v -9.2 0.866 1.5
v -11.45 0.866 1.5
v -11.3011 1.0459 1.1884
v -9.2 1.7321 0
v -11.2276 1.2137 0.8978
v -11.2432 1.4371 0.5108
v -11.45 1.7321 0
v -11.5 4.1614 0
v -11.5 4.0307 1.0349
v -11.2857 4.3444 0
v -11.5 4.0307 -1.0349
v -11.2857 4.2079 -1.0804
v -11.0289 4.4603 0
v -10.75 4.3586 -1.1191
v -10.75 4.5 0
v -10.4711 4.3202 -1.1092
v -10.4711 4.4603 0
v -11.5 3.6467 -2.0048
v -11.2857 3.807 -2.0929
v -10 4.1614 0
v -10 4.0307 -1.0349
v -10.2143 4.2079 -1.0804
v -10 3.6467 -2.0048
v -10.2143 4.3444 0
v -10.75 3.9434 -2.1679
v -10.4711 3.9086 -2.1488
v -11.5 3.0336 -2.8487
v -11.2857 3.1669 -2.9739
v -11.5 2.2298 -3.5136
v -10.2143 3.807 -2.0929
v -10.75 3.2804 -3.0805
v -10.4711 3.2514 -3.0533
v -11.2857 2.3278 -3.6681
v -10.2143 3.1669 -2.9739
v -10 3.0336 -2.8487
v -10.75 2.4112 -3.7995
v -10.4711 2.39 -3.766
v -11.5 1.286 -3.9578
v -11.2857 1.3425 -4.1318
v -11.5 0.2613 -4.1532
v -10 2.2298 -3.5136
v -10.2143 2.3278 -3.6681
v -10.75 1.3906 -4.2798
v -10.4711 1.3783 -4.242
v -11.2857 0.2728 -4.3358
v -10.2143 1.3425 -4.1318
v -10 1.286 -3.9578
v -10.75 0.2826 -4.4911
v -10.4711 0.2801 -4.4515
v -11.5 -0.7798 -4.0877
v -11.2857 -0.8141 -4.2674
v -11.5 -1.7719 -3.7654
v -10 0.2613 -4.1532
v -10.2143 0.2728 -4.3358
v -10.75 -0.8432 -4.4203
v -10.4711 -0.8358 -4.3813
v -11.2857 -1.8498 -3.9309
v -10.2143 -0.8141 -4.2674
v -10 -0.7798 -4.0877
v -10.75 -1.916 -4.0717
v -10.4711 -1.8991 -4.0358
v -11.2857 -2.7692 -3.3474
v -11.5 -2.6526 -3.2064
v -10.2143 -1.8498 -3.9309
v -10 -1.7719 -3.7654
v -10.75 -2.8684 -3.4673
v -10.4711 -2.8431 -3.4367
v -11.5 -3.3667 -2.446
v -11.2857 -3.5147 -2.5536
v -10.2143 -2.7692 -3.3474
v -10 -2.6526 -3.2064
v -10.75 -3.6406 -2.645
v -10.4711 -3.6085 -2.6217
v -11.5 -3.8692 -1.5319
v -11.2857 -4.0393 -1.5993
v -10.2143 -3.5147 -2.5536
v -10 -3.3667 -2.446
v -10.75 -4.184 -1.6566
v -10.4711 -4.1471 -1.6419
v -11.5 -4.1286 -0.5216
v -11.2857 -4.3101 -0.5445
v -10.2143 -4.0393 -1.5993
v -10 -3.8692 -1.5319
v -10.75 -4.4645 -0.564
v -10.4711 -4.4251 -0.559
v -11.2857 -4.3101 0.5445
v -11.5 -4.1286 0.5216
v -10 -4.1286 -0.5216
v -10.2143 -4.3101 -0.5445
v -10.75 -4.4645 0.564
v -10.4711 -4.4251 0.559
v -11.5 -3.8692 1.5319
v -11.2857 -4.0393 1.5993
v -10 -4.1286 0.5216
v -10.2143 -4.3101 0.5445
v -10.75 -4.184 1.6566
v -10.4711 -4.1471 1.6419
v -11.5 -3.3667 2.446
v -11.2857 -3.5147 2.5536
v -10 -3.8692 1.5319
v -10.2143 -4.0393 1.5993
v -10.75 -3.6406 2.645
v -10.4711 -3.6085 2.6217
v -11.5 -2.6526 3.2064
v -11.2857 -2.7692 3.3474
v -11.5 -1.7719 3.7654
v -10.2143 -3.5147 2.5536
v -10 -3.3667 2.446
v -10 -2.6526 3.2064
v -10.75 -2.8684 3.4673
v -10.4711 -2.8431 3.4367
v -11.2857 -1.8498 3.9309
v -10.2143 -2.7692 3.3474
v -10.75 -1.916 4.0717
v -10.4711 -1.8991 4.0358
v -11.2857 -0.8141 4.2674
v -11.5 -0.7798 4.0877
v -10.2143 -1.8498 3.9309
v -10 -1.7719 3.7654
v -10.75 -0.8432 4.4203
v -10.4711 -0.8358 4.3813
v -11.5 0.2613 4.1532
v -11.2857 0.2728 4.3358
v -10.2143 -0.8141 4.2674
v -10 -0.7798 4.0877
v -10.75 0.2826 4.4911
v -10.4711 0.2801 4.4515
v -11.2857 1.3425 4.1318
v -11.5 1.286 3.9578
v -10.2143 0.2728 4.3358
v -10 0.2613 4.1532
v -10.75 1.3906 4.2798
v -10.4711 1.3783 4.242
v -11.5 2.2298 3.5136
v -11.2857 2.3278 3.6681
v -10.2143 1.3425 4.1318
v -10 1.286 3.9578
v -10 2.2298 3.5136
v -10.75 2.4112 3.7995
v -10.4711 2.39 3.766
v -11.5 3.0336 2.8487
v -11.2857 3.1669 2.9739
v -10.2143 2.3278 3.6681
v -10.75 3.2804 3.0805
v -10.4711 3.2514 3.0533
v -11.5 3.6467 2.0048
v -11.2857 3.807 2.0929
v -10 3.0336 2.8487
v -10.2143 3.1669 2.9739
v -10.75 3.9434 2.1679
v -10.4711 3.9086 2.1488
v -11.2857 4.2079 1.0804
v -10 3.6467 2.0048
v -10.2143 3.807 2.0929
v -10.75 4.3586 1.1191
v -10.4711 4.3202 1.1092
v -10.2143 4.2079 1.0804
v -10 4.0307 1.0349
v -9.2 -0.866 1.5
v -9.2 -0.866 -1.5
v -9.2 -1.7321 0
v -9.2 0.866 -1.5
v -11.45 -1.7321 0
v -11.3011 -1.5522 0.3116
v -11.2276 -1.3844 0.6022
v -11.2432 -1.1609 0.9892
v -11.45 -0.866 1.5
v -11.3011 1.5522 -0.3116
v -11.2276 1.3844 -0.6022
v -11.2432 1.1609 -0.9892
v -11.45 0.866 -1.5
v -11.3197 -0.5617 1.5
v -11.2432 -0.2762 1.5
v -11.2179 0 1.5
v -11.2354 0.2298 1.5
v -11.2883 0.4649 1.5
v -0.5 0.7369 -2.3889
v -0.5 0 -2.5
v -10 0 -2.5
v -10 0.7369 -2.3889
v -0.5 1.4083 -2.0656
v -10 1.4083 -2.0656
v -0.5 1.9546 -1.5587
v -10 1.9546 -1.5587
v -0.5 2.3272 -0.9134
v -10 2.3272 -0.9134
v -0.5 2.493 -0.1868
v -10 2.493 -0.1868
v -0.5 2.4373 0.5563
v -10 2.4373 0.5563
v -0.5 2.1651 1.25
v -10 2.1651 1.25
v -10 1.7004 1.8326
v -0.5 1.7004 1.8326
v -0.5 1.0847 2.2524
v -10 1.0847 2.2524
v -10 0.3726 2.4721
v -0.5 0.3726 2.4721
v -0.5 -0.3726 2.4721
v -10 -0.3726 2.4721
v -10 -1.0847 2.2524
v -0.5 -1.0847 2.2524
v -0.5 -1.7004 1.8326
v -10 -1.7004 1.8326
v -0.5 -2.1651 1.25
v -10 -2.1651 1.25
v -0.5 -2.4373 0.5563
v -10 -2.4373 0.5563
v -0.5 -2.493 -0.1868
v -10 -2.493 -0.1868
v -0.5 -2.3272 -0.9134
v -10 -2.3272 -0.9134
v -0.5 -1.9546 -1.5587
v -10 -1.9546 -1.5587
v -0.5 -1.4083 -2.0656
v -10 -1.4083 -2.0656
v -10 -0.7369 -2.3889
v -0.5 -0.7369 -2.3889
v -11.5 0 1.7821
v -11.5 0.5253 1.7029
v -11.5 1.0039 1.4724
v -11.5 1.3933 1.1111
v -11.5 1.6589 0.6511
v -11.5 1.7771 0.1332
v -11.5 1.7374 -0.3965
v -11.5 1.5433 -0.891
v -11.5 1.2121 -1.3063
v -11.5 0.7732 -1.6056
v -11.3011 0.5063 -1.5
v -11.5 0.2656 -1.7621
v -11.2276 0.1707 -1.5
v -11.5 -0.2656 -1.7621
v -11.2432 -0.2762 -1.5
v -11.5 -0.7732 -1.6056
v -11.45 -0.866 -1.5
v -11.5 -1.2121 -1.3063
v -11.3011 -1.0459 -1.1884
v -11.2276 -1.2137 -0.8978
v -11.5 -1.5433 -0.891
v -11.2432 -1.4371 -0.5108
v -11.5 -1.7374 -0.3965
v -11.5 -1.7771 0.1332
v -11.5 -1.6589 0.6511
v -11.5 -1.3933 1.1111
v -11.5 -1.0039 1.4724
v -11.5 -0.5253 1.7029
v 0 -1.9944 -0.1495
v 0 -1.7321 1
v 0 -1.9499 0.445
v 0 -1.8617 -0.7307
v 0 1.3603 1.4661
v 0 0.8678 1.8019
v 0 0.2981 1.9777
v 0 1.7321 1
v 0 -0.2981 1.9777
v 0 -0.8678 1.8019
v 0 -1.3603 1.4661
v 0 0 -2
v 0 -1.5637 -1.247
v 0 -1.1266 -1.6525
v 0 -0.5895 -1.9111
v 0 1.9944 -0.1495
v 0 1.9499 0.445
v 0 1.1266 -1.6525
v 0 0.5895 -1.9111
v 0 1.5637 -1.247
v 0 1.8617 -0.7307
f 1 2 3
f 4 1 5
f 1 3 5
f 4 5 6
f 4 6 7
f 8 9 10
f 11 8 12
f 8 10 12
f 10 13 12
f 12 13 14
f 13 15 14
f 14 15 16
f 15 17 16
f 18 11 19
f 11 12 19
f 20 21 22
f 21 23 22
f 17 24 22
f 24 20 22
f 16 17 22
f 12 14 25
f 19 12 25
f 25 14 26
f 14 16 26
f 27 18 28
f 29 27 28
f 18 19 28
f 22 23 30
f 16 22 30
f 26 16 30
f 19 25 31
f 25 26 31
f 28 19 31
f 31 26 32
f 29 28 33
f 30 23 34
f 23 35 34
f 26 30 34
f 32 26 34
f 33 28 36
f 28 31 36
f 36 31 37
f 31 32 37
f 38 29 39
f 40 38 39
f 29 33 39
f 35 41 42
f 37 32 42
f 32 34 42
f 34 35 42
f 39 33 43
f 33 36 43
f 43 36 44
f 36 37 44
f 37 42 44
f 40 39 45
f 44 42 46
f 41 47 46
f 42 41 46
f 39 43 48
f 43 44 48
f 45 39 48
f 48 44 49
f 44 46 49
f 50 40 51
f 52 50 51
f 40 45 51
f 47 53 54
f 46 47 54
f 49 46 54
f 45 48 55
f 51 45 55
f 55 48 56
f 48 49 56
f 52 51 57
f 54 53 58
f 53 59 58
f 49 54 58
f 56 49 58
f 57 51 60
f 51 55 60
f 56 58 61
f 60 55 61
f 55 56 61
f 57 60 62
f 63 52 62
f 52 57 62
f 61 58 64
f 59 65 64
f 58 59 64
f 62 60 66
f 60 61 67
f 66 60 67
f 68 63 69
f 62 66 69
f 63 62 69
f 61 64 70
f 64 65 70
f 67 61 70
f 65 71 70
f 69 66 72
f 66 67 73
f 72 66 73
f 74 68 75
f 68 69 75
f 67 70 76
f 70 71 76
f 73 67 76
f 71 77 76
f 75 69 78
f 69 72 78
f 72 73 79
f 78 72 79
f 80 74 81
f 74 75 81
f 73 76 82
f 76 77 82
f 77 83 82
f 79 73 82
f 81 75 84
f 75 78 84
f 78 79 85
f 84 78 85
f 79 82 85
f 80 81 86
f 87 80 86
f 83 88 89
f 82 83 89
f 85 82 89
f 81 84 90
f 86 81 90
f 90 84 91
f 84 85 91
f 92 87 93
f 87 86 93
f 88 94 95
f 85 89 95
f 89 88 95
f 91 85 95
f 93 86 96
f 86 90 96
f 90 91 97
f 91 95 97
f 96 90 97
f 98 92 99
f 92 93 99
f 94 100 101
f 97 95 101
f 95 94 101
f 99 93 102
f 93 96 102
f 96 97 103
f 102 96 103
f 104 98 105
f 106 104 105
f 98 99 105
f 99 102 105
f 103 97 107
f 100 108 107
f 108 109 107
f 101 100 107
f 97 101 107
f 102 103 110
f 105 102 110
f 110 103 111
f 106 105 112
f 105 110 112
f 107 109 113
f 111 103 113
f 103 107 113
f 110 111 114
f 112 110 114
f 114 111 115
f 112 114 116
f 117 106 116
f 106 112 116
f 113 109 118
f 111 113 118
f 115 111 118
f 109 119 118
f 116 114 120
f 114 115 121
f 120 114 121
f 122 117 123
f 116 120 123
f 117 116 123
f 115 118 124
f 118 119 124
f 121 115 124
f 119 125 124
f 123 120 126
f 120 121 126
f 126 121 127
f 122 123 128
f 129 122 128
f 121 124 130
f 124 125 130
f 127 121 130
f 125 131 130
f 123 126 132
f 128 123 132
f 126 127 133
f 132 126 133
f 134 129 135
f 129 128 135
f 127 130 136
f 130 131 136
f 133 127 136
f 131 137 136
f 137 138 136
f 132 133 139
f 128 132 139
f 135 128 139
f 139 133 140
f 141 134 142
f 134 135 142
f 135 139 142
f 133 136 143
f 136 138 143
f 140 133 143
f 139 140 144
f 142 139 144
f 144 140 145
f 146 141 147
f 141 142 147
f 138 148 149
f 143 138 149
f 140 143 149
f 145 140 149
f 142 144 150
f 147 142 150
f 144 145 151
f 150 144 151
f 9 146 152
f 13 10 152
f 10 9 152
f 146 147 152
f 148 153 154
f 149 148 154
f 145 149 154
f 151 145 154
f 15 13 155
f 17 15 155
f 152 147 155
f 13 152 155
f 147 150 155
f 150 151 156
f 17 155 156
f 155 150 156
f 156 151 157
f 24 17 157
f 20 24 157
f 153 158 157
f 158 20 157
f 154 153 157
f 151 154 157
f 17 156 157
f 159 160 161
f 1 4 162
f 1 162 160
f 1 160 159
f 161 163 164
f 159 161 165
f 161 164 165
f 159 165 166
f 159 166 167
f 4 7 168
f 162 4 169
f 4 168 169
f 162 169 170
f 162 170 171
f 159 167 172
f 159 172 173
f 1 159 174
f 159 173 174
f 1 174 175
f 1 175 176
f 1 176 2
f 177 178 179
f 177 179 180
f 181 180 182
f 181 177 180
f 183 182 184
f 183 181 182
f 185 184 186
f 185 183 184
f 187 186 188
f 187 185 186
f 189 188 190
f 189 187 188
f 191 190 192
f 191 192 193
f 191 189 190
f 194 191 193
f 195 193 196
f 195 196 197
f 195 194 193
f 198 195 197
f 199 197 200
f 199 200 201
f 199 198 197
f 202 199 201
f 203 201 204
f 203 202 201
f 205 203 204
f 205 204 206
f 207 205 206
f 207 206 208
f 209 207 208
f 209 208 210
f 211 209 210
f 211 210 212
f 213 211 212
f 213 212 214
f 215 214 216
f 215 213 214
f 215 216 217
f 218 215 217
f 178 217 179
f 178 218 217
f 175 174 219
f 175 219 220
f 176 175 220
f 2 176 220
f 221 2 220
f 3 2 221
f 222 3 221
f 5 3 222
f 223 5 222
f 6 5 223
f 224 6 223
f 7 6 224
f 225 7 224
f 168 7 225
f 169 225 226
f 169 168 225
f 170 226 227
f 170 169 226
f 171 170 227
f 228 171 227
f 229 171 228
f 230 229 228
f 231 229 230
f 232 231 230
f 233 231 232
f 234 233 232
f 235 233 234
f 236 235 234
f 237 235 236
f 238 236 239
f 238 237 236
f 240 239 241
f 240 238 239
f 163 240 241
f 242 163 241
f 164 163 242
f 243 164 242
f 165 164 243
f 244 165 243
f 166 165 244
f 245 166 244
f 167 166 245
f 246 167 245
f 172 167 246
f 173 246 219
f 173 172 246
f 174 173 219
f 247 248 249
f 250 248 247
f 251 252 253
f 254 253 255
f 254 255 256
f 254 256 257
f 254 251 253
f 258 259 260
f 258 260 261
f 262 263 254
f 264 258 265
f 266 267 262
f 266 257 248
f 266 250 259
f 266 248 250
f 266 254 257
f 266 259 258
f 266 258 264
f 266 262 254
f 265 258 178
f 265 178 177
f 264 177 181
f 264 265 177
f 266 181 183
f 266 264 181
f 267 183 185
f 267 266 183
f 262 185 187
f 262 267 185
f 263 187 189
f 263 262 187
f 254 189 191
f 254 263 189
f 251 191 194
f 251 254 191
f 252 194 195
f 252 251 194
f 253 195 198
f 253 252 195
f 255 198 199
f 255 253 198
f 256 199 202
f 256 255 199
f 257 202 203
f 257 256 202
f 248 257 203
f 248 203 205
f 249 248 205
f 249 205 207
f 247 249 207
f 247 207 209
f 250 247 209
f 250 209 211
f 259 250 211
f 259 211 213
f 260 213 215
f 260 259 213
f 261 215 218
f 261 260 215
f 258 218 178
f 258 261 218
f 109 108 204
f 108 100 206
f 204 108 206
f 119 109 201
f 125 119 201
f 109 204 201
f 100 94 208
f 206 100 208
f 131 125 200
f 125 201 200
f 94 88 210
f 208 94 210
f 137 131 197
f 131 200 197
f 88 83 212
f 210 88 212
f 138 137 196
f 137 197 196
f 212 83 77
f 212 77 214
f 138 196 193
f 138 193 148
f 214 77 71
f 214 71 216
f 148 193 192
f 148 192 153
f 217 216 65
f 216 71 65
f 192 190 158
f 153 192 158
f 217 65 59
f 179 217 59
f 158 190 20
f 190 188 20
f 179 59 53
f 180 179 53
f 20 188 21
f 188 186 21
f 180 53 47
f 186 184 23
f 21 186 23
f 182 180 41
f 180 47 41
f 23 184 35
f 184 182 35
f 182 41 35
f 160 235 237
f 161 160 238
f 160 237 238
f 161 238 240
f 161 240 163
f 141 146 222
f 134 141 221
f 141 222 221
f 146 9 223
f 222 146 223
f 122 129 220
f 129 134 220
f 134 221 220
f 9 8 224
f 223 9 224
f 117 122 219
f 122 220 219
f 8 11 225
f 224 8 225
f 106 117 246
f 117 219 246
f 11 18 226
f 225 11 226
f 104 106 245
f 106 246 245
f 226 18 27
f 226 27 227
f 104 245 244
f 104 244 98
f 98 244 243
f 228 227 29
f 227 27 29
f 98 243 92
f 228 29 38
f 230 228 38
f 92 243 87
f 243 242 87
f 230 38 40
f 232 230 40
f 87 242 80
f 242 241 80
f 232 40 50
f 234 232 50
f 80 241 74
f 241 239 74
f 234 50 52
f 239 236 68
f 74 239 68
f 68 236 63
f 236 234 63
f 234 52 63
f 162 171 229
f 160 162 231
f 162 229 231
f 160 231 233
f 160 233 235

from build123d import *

# Parameters (mm, degrees)
SKETCH2_R           = 2.5
BOSS_EXTRUDE1_DEPTH = 10
CHAMFER1_SIZE       = 0.5
CUT_EXTRUDE1_DEPTH  = 2.3
SKETCH8_R           = 1.782050808
CUT_EXTRUDE2_DEPTH  = 1
CUT_EXTRUDE2_TAPER  = 45


with BuildPart() as part:
    # Sketch2 → Boss-Extrude1 (new body)
    with BuildSketch(Plane(origin=(0, 0, 0), x_dir=(0, 0, -1), z_dir=(1, 0, 0))):
        Circle(SKETCH2_R)
    extrude(amount=-BOSS_EXTRUDE1_DEPTH)

    # Chamfer1
    chamfer1_edges = [part.edges().sort_by_distance(p)[0] for p in [
        (0, 0, 2.5),
    ]]
    chamfer(chamfer1_edges, length=CHAMFER1_SIZE)

    # Sketch6 → Revolve1 (revolve)
    with BuildSketch(Plane.XY):
        with BuildLine():
            Line((-11.5, 0), (-11.5, 4.161437828))
            ThreePointArc((-11.5, 4.161437828), (-10.75, 4.5), (-10, 4.161437828))
            Line((-10, 4.161437828), (-10, 0))
            Line((-10, 0), (-11.5, 0))
        make_face()
    revolve(axis=Axis((-10, 0, 0), (-1, 0, 0)))

    # Sketch7 → Cut-Extrude1 (cut)
    with BuildSketch(Plane.ZY.offset(11.5)):
        Polygon((0, 1.732050808), (-1.5, 0.866025404), (-1.5, -0.866025404), (0, -1.732050808), (1.5, -0.866025404), (1.5, 0.866025404), align=None)
    extrude(amount=-CUT_EXTRUDE1_DEPTH, mode=Mode.SUBTRACT)

    # Sketch8 → Cut-Extrude2 (cut)
    with BuildSketch(Plane.ZY.offset(11.5)):
        Circle(SKETCH8_R)
    extrude(amount=-CUT_EXTRUDE2_DEPTH, taper=CUT_EXTRUDE2_TAPER, mode=Mode.SUBTRACT)


solid = part.part
